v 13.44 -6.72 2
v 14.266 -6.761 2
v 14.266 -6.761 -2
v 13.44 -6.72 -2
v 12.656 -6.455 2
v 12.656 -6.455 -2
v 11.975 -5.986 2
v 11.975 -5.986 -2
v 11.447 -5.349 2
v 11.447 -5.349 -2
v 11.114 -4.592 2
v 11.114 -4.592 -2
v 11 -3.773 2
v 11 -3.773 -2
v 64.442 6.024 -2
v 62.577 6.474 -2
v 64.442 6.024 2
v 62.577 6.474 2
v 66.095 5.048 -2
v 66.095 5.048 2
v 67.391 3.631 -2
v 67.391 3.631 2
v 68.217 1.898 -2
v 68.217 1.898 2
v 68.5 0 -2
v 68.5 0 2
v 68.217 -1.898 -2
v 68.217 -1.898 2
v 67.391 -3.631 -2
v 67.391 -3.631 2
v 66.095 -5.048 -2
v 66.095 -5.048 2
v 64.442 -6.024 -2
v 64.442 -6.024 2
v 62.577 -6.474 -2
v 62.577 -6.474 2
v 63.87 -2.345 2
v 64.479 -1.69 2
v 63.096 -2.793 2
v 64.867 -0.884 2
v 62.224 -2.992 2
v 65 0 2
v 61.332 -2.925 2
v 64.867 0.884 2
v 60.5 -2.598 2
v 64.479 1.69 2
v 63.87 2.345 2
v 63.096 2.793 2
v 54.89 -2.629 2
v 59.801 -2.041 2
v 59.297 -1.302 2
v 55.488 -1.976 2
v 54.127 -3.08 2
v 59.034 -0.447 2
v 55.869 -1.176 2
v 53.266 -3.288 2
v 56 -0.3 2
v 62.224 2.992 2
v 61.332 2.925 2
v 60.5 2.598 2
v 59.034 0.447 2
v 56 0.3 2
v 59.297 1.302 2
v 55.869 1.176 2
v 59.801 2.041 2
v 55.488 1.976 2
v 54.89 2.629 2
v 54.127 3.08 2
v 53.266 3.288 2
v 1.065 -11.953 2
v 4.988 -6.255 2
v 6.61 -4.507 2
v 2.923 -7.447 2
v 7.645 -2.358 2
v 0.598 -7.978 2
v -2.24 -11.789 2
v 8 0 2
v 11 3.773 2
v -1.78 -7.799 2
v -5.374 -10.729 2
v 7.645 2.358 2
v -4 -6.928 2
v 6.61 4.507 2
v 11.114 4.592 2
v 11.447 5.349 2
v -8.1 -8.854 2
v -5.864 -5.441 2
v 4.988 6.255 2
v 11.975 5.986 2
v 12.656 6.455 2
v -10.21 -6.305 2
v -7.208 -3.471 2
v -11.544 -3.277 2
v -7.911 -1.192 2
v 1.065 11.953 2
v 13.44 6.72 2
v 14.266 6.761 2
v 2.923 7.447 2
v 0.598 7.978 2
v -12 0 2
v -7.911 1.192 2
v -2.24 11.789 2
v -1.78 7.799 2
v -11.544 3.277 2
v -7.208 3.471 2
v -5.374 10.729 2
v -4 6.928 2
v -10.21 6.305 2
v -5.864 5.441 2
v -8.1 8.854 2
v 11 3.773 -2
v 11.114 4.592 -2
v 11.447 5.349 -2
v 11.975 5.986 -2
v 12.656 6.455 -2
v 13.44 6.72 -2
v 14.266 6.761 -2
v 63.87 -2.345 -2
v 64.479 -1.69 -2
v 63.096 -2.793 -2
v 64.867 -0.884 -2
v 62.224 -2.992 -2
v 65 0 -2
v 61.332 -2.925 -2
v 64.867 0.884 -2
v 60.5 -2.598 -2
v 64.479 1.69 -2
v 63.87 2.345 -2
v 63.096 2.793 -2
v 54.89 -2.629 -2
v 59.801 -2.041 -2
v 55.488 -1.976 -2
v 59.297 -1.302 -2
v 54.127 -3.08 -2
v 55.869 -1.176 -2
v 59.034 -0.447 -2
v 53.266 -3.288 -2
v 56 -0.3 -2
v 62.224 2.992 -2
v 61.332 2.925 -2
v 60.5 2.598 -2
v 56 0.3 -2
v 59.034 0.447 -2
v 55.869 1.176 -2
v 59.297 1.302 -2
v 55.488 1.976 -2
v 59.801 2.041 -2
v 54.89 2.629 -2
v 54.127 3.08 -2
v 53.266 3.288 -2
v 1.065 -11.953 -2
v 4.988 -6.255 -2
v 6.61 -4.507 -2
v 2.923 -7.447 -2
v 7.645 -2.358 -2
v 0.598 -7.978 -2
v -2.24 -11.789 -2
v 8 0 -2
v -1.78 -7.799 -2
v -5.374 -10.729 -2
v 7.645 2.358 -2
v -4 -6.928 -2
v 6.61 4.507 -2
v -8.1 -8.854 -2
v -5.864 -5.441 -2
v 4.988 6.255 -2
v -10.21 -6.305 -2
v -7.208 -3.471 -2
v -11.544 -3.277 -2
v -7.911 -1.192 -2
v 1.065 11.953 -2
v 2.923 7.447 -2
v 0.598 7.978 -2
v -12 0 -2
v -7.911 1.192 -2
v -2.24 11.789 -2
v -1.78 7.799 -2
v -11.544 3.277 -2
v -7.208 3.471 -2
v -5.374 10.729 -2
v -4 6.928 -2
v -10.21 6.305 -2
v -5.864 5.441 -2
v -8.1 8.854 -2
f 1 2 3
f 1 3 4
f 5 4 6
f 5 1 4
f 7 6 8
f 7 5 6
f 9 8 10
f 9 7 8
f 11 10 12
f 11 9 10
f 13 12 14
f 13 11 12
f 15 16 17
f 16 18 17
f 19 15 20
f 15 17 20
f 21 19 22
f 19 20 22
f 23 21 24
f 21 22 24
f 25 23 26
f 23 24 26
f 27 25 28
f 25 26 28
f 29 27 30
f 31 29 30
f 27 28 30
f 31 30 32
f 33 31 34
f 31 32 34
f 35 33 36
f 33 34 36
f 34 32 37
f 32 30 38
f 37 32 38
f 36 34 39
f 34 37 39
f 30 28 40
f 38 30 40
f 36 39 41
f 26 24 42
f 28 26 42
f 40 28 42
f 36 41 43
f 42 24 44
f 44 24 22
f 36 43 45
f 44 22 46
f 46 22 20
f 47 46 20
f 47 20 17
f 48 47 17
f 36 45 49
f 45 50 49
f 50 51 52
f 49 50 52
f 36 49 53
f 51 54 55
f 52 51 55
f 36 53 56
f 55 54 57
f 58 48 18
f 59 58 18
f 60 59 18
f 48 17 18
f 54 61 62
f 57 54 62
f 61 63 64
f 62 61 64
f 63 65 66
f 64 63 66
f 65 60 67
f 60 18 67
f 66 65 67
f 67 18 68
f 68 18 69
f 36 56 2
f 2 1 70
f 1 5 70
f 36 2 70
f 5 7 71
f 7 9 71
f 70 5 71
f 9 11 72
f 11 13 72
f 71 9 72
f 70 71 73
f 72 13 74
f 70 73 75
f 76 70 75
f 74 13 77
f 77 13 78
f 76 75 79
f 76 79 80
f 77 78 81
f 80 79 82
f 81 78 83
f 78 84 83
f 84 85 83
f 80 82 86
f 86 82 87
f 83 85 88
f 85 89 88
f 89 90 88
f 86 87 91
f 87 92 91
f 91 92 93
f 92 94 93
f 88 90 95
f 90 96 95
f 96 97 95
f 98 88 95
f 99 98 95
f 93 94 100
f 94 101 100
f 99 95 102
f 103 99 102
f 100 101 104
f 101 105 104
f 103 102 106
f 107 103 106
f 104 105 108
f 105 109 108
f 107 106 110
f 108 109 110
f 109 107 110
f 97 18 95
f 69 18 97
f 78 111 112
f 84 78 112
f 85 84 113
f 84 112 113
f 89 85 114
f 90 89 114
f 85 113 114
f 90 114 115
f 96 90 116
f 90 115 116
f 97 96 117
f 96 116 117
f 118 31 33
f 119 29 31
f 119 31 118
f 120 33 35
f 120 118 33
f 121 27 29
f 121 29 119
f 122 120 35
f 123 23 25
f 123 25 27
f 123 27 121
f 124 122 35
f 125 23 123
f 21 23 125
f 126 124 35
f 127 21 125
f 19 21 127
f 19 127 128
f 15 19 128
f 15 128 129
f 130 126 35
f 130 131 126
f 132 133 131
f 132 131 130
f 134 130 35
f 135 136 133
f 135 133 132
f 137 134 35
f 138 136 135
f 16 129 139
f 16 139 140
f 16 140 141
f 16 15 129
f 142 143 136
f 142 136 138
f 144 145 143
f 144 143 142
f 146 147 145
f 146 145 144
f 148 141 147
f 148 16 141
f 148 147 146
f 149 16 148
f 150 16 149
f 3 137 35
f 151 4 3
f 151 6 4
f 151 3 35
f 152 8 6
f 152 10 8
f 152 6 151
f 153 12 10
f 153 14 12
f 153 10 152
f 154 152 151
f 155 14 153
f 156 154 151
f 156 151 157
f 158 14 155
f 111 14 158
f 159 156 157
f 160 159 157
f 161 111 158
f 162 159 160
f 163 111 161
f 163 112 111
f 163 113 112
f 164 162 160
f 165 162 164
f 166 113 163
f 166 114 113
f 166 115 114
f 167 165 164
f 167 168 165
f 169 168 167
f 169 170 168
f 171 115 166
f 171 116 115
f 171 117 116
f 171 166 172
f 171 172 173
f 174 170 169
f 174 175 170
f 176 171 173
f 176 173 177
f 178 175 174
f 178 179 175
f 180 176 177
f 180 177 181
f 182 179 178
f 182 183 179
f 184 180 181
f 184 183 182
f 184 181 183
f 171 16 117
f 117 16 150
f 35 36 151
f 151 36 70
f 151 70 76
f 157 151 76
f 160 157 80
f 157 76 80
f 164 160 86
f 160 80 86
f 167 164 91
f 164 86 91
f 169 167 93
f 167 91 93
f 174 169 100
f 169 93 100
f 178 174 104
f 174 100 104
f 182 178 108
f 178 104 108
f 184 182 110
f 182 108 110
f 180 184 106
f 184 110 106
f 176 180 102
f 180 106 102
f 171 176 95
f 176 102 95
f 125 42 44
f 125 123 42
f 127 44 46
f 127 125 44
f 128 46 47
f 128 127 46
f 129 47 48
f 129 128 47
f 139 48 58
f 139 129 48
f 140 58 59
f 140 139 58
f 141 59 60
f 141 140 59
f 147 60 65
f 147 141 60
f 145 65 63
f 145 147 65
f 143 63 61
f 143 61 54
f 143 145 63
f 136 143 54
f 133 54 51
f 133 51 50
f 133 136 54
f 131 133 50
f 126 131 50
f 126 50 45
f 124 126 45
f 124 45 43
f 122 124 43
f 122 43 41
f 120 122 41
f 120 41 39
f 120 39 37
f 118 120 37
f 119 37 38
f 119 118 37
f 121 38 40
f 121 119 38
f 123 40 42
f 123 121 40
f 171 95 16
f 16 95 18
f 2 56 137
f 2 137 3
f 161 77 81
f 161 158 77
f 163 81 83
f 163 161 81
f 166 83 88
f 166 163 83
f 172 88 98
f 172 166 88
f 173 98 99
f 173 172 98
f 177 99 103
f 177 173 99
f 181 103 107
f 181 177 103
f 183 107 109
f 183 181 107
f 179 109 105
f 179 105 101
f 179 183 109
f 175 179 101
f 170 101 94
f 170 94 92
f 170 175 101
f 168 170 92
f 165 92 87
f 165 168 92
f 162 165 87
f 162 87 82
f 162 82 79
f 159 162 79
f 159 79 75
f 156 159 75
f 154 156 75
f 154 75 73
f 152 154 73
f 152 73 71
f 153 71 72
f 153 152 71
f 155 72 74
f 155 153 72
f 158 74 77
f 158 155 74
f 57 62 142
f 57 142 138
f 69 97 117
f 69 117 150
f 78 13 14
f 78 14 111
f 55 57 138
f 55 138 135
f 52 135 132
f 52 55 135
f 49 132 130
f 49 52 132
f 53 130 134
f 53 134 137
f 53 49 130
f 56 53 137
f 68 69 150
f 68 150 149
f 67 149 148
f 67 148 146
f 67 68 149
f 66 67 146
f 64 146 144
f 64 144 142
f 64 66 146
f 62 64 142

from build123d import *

# Parameters (mm, degrees)
ESQUISSE1_R          = 8
ESQUISSE1_R_2        = 3
BASE_EXTRUSION_DEPTH = 2


with BuildPart() as part:
    # Esquisse1 → Base-Extrusion (new, symmetric)
    with BuildSketch(Plane.XY):
        with BuildLine():
            Line((1.064516129, 11.9526903), (62.576612903, 6.474373913))
            ThreePointArc((62.576612903, 6.474373913), (68.5, 0), (62.576612903, -6.474373913))
            Line((62.576612903, -6.474373913), (1.064516129, -11.9526903))
            ThreePointArc((1.064516129, -11.9526903), (-12, 0), (1.064516129, 11.9526903))
        make_face()
        Circle(ESQUISSE1_R, mode=Mode.SUBTRACT)
        with Locations((62, 0)):
            Circle(ESQUISSE1_R_2, mode=Mode.SUBTRACT)
        with BuildLine():
            Line((14.266129032, 6.76111181), (53.266129032, 3.287740712))
            ThreePointArc((53.266129032, 3.287740712), (55.213412196, 2.324612939), (56, 0.299568137))
            Line((56, 0.299568137), (56, -0.299568137))
            ThreePointArc((56, -0.299568137), (55.213412196, -2.324612939), (53.266129032, -3.287740712))
            Line((53.266129032, -3.287740712), (14.266129032, -6.76111181))
            ThreePointArc((14.266129032, -6.76111181), (11.974955198, -5.98635143), (11, -3.772939235))
            Line((11, -3.772939235), (11, 3.772939235))
            ThreePointArc((11, 3.772939235), (11.974955198, 5.98635143), (14.266129032, 6.76111181))
        make_face(mode=Mode.SUBTRACT)
    extrude(amount=BASE_EXTRUSION_DEPTH, both=True)


solid = part.part
